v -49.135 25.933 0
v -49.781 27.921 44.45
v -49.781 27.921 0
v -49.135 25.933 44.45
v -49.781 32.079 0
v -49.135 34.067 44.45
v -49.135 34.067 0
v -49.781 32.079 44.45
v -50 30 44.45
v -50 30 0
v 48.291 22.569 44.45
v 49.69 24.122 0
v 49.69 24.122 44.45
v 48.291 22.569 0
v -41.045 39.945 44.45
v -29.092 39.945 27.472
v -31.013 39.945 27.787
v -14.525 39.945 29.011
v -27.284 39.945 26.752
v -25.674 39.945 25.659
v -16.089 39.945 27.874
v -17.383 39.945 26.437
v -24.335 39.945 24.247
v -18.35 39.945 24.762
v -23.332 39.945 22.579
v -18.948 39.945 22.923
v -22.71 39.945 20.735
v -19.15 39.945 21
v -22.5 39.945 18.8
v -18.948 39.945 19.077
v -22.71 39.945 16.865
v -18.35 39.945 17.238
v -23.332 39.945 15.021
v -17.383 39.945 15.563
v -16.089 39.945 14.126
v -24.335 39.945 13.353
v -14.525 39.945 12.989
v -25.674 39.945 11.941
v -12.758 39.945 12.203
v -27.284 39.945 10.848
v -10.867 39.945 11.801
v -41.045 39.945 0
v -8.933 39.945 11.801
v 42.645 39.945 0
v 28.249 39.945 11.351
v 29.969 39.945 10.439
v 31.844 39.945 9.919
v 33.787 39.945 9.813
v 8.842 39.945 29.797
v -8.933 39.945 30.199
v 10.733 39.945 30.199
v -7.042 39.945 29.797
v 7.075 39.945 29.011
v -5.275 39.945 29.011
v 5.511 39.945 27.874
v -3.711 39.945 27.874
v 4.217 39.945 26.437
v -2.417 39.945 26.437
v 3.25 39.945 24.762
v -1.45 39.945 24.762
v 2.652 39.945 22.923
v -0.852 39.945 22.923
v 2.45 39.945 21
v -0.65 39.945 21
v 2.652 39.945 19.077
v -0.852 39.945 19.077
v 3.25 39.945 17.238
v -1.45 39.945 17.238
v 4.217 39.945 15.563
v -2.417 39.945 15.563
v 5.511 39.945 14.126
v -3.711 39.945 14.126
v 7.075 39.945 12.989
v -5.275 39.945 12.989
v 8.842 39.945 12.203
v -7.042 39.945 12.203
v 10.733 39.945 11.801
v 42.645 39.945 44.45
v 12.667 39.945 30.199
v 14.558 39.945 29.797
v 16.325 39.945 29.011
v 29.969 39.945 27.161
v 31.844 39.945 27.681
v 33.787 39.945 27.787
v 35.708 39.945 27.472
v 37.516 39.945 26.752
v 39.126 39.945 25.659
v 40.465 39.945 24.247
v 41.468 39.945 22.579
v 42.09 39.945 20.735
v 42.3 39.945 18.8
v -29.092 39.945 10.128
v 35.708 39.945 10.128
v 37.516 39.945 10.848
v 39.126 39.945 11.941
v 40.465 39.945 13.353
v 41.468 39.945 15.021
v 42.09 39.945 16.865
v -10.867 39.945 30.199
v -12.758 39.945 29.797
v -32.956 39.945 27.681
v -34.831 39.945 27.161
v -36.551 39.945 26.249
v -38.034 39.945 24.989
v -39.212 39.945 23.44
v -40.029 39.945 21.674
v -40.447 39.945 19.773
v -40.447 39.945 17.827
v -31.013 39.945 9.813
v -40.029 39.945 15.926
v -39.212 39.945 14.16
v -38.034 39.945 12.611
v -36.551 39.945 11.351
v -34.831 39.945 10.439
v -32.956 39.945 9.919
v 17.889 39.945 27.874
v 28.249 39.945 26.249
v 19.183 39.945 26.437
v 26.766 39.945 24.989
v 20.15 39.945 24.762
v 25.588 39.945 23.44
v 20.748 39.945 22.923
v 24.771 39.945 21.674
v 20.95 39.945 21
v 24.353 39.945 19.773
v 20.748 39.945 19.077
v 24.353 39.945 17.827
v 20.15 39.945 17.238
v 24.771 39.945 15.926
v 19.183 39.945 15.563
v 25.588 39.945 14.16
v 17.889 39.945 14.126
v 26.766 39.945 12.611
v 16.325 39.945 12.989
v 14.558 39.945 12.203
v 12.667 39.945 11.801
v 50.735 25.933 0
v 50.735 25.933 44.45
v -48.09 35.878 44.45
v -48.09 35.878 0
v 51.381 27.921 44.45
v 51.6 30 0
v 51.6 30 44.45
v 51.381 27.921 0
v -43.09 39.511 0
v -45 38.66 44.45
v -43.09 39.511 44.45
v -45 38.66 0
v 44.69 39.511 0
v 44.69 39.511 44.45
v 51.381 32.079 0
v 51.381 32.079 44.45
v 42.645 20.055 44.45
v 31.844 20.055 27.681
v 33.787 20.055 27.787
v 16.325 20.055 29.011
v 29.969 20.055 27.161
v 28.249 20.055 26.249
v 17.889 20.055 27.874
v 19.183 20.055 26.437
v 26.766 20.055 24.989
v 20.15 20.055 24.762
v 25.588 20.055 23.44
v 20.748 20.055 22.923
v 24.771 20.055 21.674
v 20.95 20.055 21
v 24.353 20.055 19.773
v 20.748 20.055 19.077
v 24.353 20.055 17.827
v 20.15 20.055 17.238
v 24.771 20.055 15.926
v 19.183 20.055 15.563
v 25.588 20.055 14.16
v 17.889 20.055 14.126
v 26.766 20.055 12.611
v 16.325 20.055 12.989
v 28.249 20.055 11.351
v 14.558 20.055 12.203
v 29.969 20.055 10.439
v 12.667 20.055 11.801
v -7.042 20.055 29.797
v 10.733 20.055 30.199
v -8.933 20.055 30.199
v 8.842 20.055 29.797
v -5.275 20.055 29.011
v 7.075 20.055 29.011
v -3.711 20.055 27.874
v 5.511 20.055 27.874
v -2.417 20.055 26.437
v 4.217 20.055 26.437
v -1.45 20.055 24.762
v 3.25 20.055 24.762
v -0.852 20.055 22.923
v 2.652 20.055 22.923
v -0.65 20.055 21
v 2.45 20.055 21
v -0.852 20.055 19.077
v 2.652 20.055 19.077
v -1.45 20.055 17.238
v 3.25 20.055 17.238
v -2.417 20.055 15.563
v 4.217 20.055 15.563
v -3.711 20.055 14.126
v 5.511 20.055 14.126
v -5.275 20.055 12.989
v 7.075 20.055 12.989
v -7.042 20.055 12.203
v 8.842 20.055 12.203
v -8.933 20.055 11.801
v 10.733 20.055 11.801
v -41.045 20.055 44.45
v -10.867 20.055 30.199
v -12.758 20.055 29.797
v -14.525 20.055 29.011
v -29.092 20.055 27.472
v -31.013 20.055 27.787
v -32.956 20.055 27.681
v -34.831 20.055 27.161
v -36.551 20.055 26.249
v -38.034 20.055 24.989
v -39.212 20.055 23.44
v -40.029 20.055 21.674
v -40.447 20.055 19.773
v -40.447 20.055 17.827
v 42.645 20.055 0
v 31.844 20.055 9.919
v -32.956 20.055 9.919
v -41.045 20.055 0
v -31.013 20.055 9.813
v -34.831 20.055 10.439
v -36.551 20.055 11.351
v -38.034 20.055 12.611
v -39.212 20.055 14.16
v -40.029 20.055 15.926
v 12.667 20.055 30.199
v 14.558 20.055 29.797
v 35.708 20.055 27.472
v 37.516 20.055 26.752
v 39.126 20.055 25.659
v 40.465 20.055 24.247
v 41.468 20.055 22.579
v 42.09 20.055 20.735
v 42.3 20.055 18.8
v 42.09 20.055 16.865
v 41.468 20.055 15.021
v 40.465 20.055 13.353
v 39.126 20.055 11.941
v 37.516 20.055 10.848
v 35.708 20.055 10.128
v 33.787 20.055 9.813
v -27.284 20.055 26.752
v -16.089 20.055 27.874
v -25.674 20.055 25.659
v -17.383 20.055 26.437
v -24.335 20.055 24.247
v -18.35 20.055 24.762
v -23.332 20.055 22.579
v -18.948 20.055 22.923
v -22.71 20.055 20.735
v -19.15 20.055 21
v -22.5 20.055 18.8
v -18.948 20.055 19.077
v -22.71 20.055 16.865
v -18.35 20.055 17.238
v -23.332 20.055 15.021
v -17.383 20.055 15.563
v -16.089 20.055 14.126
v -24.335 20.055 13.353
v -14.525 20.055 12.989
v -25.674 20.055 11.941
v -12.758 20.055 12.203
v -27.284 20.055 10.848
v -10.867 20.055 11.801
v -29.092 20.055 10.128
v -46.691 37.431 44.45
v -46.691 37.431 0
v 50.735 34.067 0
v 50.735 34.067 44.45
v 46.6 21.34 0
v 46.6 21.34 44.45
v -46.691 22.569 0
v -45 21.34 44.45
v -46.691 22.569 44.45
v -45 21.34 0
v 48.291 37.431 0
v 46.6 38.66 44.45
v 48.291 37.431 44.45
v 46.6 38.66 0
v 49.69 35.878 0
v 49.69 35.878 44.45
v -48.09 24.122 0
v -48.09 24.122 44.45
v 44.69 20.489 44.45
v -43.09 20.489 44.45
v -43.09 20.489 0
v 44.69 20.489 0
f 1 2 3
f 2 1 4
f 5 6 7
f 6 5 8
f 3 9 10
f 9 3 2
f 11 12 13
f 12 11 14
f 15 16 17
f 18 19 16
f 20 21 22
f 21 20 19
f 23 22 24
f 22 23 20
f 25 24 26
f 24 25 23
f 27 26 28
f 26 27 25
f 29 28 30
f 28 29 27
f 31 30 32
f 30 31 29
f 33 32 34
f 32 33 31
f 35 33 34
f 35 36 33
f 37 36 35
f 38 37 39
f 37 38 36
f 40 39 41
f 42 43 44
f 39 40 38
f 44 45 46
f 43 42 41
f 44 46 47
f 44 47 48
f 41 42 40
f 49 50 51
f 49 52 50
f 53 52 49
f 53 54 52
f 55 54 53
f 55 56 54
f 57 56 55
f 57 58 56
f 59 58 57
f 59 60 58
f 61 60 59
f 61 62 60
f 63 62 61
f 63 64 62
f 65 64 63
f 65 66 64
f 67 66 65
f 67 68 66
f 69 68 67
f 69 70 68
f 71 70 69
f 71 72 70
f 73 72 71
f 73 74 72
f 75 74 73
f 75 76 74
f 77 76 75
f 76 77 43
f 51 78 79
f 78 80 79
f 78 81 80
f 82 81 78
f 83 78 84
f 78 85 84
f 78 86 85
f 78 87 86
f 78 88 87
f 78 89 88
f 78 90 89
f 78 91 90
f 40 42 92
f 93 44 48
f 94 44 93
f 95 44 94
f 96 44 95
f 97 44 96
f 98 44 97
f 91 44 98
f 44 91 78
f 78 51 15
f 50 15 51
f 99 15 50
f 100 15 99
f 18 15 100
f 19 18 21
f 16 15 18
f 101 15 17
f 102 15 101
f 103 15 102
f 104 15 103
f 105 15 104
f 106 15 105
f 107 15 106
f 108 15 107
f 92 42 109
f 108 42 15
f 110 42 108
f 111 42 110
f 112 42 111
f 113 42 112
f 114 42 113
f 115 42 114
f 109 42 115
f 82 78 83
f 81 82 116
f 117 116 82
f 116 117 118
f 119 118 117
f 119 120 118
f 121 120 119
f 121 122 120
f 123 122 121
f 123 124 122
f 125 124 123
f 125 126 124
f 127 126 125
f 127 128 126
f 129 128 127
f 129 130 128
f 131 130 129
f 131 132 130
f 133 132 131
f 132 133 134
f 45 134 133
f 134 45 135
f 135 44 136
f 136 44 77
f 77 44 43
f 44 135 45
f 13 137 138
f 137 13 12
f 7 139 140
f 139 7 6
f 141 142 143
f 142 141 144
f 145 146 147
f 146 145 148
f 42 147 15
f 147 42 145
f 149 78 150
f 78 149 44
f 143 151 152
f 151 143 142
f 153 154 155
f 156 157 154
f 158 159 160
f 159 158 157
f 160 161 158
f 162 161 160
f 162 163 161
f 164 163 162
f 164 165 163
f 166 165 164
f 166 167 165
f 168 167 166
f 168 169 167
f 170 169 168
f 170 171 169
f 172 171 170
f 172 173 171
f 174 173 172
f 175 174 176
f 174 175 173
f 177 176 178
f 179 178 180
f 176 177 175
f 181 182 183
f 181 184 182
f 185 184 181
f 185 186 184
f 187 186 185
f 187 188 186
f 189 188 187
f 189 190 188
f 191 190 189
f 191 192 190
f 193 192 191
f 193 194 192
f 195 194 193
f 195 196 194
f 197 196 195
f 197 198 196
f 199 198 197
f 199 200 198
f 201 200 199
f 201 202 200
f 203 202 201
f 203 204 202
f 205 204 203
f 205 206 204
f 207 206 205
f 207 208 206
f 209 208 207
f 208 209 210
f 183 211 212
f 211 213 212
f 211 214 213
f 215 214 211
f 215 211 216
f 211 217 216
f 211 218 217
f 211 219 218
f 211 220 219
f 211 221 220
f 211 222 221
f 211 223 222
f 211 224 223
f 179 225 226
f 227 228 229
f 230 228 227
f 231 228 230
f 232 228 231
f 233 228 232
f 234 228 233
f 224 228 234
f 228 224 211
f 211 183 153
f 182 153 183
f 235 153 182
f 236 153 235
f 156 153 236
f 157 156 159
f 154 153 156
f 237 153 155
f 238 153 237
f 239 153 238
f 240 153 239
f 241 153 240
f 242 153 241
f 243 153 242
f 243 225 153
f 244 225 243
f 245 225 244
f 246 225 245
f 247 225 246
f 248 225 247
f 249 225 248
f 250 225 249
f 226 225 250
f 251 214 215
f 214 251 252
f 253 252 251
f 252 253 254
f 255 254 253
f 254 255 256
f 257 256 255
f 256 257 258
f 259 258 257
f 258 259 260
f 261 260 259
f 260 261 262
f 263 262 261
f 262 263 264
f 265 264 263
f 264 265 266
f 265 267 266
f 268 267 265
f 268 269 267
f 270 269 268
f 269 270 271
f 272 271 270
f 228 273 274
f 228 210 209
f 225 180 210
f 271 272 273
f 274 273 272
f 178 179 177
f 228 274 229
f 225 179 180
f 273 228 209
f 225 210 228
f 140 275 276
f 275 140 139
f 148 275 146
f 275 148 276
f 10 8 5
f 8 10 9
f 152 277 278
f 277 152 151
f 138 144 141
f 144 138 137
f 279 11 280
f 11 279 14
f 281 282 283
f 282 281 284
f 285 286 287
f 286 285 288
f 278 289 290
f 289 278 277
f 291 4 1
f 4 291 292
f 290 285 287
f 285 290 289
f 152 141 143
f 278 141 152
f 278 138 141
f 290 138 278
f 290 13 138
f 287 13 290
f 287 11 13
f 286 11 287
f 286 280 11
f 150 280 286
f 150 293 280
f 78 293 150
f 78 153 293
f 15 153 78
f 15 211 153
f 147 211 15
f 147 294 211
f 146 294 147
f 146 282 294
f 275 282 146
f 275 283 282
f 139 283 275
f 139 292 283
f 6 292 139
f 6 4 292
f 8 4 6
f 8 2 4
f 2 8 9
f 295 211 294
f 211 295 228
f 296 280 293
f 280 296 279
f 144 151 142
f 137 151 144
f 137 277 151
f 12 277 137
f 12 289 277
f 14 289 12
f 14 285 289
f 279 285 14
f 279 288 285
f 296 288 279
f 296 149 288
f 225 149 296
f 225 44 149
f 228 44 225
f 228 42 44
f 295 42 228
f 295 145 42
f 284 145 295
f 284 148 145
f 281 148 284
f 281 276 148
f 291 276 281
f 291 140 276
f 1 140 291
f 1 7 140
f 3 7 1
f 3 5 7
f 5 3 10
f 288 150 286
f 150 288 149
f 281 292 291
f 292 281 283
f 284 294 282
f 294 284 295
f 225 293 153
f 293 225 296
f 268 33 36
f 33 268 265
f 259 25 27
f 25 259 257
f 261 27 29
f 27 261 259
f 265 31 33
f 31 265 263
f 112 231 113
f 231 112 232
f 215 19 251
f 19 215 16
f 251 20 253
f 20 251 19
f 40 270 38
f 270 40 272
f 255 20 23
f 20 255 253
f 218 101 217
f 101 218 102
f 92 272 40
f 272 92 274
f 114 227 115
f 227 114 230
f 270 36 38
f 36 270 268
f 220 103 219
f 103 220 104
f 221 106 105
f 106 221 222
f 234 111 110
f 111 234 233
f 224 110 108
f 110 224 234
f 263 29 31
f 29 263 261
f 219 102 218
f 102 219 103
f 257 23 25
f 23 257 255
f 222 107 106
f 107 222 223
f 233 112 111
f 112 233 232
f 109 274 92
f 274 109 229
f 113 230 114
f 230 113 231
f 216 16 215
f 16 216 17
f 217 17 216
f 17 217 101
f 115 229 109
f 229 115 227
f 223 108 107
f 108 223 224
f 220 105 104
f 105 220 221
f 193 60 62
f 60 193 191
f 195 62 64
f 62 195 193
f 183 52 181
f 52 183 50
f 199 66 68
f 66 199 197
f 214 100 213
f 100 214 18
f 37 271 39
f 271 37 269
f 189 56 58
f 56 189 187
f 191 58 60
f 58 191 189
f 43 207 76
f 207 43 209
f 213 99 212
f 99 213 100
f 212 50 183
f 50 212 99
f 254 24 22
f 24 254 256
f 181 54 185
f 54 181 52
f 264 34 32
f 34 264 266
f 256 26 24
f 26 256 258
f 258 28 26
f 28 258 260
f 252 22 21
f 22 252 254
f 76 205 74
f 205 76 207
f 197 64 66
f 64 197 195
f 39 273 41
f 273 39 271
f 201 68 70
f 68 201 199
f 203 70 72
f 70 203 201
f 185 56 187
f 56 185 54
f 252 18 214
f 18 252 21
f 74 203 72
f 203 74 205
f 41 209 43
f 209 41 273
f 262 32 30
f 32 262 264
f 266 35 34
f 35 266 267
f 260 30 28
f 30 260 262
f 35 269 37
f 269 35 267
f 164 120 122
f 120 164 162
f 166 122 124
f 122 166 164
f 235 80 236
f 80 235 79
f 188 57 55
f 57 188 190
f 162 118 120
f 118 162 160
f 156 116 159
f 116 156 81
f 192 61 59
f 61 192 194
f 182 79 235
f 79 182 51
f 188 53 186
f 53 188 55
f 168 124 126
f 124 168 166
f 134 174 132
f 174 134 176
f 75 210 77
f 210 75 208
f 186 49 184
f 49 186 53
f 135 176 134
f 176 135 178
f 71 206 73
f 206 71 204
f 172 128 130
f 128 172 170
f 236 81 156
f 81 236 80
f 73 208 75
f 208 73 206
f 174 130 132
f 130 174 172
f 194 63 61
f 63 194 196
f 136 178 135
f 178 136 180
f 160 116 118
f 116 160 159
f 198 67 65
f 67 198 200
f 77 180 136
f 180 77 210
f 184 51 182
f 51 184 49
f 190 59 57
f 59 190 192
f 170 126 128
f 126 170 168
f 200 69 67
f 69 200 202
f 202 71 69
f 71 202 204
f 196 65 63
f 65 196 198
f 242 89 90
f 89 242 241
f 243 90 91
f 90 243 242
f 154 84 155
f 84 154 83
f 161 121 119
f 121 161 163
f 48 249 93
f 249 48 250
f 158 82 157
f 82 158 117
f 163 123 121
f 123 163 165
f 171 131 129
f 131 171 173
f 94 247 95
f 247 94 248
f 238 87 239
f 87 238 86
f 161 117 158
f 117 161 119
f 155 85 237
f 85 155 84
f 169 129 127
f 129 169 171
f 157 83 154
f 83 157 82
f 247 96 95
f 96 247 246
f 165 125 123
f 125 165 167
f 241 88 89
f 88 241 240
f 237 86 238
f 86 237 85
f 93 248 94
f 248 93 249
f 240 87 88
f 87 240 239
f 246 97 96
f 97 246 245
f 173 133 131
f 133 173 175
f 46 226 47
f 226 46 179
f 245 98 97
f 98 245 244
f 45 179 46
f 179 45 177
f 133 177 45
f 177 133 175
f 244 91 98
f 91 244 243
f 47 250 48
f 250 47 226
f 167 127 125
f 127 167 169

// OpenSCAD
//////////////  Brush Knuckles ///////////////////



/////////////////// Render //////////////////
difference() {

	translate([-50,20,0]){
		roundedRect(101.6,20,44.45,10);
	}

	translate([-31.5,50,18.8]){
		rotate([90,0,0]){
		cylinder(h= 50,d = 18);
		}
	}
	translate([-9.9,50,21]){
		rotate([90,0,0]){
		cylinder(h= 50,d = 18.5);
		}
	}

	translate([11.7,50,21]){
		rotate([90,0,0]){
		cylinder(h= 50,d = 18.5);
		}
	}

	translate([33.3,50,18.8]){
		rotate([90,0,0]){
		cylinder(h= 50,d = 18);
		}
	}
	
}


////////////////// Modules //////////////////

module roundedRect(length, width, height, radius) {
x = length;
y = width;
z = height;

linear_extrude(height=z)
hull() {
translate([radius, radius, 0])
circle(r=radius);

translate([x - radius, radius, 0])
circle(r=radius);

translate([x - radius, y - radius, 0])
circle(r=radius);

translate([radius, y - radius, 0])
circle(r=radius);
			}
}
